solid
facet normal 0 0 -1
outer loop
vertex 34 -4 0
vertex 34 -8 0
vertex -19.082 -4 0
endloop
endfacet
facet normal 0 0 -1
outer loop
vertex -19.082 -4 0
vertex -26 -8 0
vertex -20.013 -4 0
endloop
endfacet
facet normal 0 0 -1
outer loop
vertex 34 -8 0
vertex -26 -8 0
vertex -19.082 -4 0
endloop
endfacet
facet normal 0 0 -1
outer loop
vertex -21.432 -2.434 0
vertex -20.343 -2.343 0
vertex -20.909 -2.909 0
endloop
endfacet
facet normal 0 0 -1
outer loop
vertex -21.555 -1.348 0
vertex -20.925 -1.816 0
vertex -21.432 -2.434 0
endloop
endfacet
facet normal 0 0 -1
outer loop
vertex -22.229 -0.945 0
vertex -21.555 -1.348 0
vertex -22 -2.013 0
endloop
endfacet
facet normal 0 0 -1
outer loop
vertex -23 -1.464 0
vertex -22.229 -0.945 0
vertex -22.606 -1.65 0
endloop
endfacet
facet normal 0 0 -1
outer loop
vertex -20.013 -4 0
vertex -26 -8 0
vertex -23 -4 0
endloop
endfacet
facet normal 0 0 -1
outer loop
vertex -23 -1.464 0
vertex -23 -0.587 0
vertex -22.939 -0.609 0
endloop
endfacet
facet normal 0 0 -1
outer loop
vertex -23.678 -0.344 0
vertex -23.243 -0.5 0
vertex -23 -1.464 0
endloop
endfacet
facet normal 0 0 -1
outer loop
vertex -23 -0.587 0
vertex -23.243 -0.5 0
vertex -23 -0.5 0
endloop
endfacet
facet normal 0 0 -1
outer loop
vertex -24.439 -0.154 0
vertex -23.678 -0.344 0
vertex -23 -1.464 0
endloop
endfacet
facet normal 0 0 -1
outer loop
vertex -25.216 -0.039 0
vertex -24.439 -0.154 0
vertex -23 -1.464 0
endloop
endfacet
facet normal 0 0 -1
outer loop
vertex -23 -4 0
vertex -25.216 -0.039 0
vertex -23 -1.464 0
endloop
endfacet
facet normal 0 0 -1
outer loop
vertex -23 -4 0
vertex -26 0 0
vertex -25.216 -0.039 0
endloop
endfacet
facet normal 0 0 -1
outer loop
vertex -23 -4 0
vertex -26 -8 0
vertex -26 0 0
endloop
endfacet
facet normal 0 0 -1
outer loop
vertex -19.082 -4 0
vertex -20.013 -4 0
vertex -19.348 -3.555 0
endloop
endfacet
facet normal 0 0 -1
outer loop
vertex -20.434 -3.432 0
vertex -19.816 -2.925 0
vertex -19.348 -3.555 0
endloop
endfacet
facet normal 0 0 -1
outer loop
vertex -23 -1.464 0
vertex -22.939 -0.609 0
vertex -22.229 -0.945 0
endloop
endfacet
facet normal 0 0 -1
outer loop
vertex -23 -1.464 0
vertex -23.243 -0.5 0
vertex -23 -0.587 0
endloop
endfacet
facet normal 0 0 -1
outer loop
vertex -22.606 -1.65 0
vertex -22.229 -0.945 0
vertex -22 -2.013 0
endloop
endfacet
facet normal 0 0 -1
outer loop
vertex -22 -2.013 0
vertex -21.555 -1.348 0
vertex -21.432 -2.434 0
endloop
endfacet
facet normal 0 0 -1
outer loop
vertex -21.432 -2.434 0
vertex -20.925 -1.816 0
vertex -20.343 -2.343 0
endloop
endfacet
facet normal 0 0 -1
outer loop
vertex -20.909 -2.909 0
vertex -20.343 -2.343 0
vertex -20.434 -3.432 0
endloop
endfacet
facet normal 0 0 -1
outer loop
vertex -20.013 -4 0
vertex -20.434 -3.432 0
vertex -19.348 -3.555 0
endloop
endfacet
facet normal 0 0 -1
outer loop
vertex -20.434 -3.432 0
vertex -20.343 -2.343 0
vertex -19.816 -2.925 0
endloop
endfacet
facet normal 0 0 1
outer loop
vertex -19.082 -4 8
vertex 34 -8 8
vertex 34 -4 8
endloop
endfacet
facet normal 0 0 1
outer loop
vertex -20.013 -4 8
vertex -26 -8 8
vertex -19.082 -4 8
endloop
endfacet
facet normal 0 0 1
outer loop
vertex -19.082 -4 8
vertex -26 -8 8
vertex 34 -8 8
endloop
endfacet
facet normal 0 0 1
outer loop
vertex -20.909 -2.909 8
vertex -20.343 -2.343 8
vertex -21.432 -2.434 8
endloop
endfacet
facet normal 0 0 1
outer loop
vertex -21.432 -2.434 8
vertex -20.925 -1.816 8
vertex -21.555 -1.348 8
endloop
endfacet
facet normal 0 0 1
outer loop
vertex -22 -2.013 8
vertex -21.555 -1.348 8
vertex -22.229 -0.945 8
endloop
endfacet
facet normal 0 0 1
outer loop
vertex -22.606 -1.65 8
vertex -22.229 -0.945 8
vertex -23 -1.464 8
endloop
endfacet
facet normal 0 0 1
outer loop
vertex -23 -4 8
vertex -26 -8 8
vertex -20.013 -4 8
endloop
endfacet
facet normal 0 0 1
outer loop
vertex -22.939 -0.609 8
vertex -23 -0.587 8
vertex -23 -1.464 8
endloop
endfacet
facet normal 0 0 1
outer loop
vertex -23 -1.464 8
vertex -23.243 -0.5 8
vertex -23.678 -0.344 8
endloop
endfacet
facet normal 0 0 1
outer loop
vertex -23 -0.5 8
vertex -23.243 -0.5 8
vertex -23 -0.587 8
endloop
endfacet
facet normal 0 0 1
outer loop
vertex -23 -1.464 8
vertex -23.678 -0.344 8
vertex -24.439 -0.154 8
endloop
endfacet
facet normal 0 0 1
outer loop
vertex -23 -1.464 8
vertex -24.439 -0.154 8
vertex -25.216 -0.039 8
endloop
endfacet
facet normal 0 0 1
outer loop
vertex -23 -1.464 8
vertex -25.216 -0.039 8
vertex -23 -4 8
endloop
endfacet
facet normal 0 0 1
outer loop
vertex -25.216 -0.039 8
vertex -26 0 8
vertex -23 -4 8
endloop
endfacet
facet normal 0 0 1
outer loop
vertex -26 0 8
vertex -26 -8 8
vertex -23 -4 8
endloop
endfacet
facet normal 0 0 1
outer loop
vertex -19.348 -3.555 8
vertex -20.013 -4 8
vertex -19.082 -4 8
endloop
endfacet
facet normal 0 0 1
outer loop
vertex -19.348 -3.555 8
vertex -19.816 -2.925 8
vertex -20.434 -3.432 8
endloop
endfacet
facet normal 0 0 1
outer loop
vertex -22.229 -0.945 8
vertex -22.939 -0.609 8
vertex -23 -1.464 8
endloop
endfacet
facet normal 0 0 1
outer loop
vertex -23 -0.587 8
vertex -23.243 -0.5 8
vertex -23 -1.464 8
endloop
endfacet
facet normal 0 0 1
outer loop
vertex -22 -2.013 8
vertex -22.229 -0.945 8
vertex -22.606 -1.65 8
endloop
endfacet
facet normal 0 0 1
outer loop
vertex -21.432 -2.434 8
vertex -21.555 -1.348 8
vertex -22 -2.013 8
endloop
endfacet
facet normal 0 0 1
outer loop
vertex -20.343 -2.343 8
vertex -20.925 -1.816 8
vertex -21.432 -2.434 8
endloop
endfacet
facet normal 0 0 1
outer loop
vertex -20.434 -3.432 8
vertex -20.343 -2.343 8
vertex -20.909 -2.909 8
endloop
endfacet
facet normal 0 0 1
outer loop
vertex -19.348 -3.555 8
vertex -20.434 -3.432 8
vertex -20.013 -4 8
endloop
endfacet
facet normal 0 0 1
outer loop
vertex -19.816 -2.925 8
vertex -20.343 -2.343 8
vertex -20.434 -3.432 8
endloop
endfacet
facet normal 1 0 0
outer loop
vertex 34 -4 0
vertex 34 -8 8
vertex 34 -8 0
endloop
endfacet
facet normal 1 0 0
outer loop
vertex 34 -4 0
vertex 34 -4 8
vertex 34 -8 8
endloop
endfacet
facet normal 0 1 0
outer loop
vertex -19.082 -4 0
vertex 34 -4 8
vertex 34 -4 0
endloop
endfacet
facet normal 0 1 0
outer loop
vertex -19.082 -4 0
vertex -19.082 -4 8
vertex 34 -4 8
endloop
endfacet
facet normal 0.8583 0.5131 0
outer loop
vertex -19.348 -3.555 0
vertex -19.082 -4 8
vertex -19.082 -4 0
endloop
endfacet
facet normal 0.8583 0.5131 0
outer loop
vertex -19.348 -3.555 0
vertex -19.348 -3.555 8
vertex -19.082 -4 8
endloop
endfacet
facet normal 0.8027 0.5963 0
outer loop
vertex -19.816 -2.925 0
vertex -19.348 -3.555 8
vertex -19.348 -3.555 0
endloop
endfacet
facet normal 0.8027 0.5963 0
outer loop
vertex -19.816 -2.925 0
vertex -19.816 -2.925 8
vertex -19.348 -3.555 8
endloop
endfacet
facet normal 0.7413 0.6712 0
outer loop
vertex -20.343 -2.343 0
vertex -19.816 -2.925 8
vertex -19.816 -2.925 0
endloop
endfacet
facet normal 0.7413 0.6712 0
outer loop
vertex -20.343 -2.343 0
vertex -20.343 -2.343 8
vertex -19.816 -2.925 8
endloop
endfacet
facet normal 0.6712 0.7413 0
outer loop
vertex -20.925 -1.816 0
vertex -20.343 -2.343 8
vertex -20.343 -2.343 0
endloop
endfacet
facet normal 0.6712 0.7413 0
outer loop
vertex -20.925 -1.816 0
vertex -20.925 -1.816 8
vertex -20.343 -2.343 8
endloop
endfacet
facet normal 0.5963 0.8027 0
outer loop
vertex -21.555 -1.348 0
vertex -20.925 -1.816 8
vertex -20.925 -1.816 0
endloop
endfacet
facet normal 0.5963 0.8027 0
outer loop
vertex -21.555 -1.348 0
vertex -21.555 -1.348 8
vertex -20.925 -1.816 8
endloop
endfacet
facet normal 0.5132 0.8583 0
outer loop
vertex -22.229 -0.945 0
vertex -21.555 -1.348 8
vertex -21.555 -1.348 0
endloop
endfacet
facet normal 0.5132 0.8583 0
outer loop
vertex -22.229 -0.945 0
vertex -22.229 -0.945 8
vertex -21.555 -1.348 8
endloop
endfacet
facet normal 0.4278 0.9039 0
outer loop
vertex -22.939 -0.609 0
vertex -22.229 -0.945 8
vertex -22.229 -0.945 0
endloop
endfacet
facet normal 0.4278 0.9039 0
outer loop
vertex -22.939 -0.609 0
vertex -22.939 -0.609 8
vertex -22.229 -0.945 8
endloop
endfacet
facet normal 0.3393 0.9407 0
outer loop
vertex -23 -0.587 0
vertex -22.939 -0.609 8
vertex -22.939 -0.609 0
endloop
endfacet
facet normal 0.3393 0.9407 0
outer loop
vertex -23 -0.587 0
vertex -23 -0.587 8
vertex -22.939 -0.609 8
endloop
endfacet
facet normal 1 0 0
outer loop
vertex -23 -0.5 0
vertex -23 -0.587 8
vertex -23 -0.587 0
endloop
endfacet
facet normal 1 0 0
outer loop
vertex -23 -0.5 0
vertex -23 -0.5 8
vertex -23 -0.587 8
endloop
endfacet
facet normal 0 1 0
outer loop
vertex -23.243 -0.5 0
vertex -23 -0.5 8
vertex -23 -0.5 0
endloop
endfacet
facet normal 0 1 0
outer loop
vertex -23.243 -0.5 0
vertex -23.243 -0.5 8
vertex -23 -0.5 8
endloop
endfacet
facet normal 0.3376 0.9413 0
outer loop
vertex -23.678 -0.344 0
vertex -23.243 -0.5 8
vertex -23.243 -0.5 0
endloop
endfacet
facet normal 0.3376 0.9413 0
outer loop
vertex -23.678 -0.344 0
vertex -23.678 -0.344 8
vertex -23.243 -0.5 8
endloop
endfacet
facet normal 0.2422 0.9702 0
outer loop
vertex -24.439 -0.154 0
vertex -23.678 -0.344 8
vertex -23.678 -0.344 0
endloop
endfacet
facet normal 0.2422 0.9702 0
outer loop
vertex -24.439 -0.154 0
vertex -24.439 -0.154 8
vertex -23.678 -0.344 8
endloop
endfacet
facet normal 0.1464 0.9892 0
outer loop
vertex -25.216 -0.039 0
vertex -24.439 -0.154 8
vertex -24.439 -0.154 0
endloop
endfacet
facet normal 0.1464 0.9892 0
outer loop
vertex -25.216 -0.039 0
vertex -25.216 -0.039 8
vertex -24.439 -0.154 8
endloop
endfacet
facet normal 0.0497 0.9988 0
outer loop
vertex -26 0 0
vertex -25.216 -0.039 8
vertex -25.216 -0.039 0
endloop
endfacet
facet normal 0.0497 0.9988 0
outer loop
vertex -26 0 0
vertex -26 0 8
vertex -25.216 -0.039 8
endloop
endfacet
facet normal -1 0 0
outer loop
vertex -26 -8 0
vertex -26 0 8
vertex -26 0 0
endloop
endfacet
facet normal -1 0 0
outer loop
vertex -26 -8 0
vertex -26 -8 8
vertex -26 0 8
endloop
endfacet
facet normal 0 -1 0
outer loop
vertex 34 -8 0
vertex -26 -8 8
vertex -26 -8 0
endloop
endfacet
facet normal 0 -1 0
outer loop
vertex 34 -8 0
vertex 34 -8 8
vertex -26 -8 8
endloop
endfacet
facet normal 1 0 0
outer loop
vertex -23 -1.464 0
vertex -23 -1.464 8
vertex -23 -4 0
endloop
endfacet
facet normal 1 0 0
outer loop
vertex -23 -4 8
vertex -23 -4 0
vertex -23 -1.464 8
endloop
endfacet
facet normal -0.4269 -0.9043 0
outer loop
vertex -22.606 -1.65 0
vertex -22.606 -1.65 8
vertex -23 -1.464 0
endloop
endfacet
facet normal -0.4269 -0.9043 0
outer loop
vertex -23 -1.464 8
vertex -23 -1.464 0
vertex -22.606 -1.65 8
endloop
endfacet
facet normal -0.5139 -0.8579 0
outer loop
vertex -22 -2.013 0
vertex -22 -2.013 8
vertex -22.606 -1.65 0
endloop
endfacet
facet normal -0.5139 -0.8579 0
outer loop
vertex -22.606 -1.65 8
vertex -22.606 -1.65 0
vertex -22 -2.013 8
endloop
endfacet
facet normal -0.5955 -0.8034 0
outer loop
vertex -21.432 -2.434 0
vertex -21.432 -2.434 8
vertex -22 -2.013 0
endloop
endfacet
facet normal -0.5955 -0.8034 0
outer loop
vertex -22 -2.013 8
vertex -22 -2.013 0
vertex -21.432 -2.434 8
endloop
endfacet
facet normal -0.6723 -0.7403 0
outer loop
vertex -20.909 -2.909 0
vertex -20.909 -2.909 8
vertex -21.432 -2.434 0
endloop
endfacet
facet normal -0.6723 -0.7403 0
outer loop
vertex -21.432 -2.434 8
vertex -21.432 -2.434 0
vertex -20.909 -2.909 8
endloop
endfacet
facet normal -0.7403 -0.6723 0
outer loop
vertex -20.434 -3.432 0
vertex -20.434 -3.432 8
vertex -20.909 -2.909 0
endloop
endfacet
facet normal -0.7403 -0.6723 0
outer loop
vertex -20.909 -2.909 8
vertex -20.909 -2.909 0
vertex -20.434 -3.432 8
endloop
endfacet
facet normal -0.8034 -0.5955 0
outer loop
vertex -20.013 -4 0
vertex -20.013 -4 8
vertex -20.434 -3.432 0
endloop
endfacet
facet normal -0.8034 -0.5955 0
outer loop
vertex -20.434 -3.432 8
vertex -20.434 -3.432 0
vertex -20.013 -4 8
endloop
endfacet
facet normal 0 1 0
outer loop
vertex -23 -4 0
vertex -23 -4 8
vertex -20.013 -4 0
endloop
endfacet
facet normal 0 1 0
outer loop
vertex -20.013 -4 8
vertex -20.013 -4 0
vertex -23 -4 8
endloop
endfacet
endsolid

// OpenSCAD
// Pinch clamp for silicone tubing (up to 6.4 mm across)
// Printed flat: 2-D profile in XY, extruded 8 mm along Z.
// Rests on XY plane at z = 0, builds upward (+Z). Centred on origin in X and Y.

$fn = 64;

// ---- Global dimensions (mm) ----
extrude_h   = 8;    // print thickness along Z

// Lower jaw
lower_bar_x0 = 0;   // left end of lower bar
lower_bar_x1 = 50;  // right end of lower bar (start of tongue)
lower_bar_y0 = 0;   // bottom face of lower bar
lower_bar_y1 = 4;   // top face of lower bar
lower_tongue_x0 = 50; // left end of tongue
lower_tongue_x1 = 56; // right end of tongue
lower_tongue_y0 = 2.5; // bottom face of tongue
lower_tongue_y1 = 4;   // top face of tongue

// Upper jaw
upper_bar_x0 = 0;   // left end of upper bar
upper_bar_x1 = 60;  // right end of upper bar
upper_bar_y0 = 12;  // bottom face of upper bar
upper_bar_y1 = 16;  // top face of upper bar

// Living hinge (half-ring on x < 0 side, centred at (0, 8))
hinge_cx = 0;
hinge_cy = 8;
hinge_r_inner = 7.2; // inner radius
hinge_r_outer = 8.0; // outer radius (0.8 mm thick)

// Pinch ridges (half-round, 1.5 mm radius, on inner faces at x = 27.5)
ridge_x = 27.5;
ridge_r = 1.5;
lower_ridge_cy = 4;  // centred on lower jaw inner face (y = 4)
upper_ridge_cy = 12; // centred on upper jaw inner face (y = 12)

// Snap latch (hangs from upper jaw right end)
latch_leg_x0 = 57;   // left end of latch leg
latch_leg_x1 = 60;   // right end of latch leg
latch_leg_y0 = 4.5;  // bottom face of latch leg
latch_leg_y1 = 12;   // top face of latch leg (meets upper bar bottom)
latch_nose_x0 = 54.5; // left end of nose
latch_nose_x1 = 57;   // right end of nose
latch_nose_y0 = 4.5;  // bottom face of nose
latch_nose_y1 = 5.5;  // top face of nose (0.5 mm above tongue top at y = 5)

// ---- 2-D profile pieces (in XY plane) ----

// Lower jaw: bar + tongue
module lower_profile() { union() {
    square([lower_bar_x1 - lower_bar_x0, lower_bar_y1 - lower_bar_y0],
           center = [false, false]);
    square([lower_tongue_x1 - lower_tongue_x0, lower_tongue_y1 - lower_tongue_y0],
           center = [false, false]);
} }

// Upper jaw: bar
module upper_profile() { square([upper_bar_x1 - upper_bar_x0, upper_bar_y1 - upper_bar_y0],
                       center = [false, false]); }

// Hinge: half-ring on x < 0 side (left half of annulus centred at (0, 8))
module hinge_half() { intersection() {
    difference() {
        circle(d = hinge_r_outer * 2, $fn = $fn);
        circle(d = hinge_r_inner * 2, $fn = $fn);
    }
    square([100, 100], center = [false, false]); // x <= 0, all y
} }

// Lower pinch ridge: half-circle bulging into the gap (y > 4 side)
module lower_ridge() { intersection() {
    circle(d = ridge_r * 2, $fn = $fn);
    square([100, 100], center = [false, false]); // y >= 4
} }

// Upper pinch ridge: half-circle bulging into the gap (y < 12 side)
module upper_ridge() { intersection() {
    circle(d = ridge_r * 2, $fn = $fn);
    square([100, 100], center = [false, false]); // y <= 12
} }

// Latch leg
module latch_leg() { square([latch_leg_x1 - latch_leg_x0, latch_leg_y1 - latch_leg_y0],
                   center = [false, false]); }

// Latch nose
module latch_nose() { square([latch_nose_x1 - latch_nose_x0, latch_nose_y1 - latch_nose_y0],
                    center = [false, false]); }

// ---- Assemble 2-D profile ----
module profile() { union() {
    lower_profile();
    upper_profile();
    hinge_half();
    lower_ridge();
    upper_ridge();
    latch_leg();
    latch_nose();
} }

// ---- Extrude and centre on origin in X and Y ----
// Bounding box of the profile:
// x_min = -hinge_r_outer (leftmost point of hinge)
// x_max = upper_bar_x1 (rightmost point of upper bar / latch leg)
// y_min = lower_bar_y0
// y_max = upper_bar_y1
x_min = -hinge_r_outer;
x_max = upper_bar_x1;
y_min = lower_bar_y0;
y_max = upper_bar_y1;

translate([-(x_min + x_max) / 2, -(y_min + y_max) / 2, 0])
    linear_extrude(height = extrude_h, center = false)
        profile();
